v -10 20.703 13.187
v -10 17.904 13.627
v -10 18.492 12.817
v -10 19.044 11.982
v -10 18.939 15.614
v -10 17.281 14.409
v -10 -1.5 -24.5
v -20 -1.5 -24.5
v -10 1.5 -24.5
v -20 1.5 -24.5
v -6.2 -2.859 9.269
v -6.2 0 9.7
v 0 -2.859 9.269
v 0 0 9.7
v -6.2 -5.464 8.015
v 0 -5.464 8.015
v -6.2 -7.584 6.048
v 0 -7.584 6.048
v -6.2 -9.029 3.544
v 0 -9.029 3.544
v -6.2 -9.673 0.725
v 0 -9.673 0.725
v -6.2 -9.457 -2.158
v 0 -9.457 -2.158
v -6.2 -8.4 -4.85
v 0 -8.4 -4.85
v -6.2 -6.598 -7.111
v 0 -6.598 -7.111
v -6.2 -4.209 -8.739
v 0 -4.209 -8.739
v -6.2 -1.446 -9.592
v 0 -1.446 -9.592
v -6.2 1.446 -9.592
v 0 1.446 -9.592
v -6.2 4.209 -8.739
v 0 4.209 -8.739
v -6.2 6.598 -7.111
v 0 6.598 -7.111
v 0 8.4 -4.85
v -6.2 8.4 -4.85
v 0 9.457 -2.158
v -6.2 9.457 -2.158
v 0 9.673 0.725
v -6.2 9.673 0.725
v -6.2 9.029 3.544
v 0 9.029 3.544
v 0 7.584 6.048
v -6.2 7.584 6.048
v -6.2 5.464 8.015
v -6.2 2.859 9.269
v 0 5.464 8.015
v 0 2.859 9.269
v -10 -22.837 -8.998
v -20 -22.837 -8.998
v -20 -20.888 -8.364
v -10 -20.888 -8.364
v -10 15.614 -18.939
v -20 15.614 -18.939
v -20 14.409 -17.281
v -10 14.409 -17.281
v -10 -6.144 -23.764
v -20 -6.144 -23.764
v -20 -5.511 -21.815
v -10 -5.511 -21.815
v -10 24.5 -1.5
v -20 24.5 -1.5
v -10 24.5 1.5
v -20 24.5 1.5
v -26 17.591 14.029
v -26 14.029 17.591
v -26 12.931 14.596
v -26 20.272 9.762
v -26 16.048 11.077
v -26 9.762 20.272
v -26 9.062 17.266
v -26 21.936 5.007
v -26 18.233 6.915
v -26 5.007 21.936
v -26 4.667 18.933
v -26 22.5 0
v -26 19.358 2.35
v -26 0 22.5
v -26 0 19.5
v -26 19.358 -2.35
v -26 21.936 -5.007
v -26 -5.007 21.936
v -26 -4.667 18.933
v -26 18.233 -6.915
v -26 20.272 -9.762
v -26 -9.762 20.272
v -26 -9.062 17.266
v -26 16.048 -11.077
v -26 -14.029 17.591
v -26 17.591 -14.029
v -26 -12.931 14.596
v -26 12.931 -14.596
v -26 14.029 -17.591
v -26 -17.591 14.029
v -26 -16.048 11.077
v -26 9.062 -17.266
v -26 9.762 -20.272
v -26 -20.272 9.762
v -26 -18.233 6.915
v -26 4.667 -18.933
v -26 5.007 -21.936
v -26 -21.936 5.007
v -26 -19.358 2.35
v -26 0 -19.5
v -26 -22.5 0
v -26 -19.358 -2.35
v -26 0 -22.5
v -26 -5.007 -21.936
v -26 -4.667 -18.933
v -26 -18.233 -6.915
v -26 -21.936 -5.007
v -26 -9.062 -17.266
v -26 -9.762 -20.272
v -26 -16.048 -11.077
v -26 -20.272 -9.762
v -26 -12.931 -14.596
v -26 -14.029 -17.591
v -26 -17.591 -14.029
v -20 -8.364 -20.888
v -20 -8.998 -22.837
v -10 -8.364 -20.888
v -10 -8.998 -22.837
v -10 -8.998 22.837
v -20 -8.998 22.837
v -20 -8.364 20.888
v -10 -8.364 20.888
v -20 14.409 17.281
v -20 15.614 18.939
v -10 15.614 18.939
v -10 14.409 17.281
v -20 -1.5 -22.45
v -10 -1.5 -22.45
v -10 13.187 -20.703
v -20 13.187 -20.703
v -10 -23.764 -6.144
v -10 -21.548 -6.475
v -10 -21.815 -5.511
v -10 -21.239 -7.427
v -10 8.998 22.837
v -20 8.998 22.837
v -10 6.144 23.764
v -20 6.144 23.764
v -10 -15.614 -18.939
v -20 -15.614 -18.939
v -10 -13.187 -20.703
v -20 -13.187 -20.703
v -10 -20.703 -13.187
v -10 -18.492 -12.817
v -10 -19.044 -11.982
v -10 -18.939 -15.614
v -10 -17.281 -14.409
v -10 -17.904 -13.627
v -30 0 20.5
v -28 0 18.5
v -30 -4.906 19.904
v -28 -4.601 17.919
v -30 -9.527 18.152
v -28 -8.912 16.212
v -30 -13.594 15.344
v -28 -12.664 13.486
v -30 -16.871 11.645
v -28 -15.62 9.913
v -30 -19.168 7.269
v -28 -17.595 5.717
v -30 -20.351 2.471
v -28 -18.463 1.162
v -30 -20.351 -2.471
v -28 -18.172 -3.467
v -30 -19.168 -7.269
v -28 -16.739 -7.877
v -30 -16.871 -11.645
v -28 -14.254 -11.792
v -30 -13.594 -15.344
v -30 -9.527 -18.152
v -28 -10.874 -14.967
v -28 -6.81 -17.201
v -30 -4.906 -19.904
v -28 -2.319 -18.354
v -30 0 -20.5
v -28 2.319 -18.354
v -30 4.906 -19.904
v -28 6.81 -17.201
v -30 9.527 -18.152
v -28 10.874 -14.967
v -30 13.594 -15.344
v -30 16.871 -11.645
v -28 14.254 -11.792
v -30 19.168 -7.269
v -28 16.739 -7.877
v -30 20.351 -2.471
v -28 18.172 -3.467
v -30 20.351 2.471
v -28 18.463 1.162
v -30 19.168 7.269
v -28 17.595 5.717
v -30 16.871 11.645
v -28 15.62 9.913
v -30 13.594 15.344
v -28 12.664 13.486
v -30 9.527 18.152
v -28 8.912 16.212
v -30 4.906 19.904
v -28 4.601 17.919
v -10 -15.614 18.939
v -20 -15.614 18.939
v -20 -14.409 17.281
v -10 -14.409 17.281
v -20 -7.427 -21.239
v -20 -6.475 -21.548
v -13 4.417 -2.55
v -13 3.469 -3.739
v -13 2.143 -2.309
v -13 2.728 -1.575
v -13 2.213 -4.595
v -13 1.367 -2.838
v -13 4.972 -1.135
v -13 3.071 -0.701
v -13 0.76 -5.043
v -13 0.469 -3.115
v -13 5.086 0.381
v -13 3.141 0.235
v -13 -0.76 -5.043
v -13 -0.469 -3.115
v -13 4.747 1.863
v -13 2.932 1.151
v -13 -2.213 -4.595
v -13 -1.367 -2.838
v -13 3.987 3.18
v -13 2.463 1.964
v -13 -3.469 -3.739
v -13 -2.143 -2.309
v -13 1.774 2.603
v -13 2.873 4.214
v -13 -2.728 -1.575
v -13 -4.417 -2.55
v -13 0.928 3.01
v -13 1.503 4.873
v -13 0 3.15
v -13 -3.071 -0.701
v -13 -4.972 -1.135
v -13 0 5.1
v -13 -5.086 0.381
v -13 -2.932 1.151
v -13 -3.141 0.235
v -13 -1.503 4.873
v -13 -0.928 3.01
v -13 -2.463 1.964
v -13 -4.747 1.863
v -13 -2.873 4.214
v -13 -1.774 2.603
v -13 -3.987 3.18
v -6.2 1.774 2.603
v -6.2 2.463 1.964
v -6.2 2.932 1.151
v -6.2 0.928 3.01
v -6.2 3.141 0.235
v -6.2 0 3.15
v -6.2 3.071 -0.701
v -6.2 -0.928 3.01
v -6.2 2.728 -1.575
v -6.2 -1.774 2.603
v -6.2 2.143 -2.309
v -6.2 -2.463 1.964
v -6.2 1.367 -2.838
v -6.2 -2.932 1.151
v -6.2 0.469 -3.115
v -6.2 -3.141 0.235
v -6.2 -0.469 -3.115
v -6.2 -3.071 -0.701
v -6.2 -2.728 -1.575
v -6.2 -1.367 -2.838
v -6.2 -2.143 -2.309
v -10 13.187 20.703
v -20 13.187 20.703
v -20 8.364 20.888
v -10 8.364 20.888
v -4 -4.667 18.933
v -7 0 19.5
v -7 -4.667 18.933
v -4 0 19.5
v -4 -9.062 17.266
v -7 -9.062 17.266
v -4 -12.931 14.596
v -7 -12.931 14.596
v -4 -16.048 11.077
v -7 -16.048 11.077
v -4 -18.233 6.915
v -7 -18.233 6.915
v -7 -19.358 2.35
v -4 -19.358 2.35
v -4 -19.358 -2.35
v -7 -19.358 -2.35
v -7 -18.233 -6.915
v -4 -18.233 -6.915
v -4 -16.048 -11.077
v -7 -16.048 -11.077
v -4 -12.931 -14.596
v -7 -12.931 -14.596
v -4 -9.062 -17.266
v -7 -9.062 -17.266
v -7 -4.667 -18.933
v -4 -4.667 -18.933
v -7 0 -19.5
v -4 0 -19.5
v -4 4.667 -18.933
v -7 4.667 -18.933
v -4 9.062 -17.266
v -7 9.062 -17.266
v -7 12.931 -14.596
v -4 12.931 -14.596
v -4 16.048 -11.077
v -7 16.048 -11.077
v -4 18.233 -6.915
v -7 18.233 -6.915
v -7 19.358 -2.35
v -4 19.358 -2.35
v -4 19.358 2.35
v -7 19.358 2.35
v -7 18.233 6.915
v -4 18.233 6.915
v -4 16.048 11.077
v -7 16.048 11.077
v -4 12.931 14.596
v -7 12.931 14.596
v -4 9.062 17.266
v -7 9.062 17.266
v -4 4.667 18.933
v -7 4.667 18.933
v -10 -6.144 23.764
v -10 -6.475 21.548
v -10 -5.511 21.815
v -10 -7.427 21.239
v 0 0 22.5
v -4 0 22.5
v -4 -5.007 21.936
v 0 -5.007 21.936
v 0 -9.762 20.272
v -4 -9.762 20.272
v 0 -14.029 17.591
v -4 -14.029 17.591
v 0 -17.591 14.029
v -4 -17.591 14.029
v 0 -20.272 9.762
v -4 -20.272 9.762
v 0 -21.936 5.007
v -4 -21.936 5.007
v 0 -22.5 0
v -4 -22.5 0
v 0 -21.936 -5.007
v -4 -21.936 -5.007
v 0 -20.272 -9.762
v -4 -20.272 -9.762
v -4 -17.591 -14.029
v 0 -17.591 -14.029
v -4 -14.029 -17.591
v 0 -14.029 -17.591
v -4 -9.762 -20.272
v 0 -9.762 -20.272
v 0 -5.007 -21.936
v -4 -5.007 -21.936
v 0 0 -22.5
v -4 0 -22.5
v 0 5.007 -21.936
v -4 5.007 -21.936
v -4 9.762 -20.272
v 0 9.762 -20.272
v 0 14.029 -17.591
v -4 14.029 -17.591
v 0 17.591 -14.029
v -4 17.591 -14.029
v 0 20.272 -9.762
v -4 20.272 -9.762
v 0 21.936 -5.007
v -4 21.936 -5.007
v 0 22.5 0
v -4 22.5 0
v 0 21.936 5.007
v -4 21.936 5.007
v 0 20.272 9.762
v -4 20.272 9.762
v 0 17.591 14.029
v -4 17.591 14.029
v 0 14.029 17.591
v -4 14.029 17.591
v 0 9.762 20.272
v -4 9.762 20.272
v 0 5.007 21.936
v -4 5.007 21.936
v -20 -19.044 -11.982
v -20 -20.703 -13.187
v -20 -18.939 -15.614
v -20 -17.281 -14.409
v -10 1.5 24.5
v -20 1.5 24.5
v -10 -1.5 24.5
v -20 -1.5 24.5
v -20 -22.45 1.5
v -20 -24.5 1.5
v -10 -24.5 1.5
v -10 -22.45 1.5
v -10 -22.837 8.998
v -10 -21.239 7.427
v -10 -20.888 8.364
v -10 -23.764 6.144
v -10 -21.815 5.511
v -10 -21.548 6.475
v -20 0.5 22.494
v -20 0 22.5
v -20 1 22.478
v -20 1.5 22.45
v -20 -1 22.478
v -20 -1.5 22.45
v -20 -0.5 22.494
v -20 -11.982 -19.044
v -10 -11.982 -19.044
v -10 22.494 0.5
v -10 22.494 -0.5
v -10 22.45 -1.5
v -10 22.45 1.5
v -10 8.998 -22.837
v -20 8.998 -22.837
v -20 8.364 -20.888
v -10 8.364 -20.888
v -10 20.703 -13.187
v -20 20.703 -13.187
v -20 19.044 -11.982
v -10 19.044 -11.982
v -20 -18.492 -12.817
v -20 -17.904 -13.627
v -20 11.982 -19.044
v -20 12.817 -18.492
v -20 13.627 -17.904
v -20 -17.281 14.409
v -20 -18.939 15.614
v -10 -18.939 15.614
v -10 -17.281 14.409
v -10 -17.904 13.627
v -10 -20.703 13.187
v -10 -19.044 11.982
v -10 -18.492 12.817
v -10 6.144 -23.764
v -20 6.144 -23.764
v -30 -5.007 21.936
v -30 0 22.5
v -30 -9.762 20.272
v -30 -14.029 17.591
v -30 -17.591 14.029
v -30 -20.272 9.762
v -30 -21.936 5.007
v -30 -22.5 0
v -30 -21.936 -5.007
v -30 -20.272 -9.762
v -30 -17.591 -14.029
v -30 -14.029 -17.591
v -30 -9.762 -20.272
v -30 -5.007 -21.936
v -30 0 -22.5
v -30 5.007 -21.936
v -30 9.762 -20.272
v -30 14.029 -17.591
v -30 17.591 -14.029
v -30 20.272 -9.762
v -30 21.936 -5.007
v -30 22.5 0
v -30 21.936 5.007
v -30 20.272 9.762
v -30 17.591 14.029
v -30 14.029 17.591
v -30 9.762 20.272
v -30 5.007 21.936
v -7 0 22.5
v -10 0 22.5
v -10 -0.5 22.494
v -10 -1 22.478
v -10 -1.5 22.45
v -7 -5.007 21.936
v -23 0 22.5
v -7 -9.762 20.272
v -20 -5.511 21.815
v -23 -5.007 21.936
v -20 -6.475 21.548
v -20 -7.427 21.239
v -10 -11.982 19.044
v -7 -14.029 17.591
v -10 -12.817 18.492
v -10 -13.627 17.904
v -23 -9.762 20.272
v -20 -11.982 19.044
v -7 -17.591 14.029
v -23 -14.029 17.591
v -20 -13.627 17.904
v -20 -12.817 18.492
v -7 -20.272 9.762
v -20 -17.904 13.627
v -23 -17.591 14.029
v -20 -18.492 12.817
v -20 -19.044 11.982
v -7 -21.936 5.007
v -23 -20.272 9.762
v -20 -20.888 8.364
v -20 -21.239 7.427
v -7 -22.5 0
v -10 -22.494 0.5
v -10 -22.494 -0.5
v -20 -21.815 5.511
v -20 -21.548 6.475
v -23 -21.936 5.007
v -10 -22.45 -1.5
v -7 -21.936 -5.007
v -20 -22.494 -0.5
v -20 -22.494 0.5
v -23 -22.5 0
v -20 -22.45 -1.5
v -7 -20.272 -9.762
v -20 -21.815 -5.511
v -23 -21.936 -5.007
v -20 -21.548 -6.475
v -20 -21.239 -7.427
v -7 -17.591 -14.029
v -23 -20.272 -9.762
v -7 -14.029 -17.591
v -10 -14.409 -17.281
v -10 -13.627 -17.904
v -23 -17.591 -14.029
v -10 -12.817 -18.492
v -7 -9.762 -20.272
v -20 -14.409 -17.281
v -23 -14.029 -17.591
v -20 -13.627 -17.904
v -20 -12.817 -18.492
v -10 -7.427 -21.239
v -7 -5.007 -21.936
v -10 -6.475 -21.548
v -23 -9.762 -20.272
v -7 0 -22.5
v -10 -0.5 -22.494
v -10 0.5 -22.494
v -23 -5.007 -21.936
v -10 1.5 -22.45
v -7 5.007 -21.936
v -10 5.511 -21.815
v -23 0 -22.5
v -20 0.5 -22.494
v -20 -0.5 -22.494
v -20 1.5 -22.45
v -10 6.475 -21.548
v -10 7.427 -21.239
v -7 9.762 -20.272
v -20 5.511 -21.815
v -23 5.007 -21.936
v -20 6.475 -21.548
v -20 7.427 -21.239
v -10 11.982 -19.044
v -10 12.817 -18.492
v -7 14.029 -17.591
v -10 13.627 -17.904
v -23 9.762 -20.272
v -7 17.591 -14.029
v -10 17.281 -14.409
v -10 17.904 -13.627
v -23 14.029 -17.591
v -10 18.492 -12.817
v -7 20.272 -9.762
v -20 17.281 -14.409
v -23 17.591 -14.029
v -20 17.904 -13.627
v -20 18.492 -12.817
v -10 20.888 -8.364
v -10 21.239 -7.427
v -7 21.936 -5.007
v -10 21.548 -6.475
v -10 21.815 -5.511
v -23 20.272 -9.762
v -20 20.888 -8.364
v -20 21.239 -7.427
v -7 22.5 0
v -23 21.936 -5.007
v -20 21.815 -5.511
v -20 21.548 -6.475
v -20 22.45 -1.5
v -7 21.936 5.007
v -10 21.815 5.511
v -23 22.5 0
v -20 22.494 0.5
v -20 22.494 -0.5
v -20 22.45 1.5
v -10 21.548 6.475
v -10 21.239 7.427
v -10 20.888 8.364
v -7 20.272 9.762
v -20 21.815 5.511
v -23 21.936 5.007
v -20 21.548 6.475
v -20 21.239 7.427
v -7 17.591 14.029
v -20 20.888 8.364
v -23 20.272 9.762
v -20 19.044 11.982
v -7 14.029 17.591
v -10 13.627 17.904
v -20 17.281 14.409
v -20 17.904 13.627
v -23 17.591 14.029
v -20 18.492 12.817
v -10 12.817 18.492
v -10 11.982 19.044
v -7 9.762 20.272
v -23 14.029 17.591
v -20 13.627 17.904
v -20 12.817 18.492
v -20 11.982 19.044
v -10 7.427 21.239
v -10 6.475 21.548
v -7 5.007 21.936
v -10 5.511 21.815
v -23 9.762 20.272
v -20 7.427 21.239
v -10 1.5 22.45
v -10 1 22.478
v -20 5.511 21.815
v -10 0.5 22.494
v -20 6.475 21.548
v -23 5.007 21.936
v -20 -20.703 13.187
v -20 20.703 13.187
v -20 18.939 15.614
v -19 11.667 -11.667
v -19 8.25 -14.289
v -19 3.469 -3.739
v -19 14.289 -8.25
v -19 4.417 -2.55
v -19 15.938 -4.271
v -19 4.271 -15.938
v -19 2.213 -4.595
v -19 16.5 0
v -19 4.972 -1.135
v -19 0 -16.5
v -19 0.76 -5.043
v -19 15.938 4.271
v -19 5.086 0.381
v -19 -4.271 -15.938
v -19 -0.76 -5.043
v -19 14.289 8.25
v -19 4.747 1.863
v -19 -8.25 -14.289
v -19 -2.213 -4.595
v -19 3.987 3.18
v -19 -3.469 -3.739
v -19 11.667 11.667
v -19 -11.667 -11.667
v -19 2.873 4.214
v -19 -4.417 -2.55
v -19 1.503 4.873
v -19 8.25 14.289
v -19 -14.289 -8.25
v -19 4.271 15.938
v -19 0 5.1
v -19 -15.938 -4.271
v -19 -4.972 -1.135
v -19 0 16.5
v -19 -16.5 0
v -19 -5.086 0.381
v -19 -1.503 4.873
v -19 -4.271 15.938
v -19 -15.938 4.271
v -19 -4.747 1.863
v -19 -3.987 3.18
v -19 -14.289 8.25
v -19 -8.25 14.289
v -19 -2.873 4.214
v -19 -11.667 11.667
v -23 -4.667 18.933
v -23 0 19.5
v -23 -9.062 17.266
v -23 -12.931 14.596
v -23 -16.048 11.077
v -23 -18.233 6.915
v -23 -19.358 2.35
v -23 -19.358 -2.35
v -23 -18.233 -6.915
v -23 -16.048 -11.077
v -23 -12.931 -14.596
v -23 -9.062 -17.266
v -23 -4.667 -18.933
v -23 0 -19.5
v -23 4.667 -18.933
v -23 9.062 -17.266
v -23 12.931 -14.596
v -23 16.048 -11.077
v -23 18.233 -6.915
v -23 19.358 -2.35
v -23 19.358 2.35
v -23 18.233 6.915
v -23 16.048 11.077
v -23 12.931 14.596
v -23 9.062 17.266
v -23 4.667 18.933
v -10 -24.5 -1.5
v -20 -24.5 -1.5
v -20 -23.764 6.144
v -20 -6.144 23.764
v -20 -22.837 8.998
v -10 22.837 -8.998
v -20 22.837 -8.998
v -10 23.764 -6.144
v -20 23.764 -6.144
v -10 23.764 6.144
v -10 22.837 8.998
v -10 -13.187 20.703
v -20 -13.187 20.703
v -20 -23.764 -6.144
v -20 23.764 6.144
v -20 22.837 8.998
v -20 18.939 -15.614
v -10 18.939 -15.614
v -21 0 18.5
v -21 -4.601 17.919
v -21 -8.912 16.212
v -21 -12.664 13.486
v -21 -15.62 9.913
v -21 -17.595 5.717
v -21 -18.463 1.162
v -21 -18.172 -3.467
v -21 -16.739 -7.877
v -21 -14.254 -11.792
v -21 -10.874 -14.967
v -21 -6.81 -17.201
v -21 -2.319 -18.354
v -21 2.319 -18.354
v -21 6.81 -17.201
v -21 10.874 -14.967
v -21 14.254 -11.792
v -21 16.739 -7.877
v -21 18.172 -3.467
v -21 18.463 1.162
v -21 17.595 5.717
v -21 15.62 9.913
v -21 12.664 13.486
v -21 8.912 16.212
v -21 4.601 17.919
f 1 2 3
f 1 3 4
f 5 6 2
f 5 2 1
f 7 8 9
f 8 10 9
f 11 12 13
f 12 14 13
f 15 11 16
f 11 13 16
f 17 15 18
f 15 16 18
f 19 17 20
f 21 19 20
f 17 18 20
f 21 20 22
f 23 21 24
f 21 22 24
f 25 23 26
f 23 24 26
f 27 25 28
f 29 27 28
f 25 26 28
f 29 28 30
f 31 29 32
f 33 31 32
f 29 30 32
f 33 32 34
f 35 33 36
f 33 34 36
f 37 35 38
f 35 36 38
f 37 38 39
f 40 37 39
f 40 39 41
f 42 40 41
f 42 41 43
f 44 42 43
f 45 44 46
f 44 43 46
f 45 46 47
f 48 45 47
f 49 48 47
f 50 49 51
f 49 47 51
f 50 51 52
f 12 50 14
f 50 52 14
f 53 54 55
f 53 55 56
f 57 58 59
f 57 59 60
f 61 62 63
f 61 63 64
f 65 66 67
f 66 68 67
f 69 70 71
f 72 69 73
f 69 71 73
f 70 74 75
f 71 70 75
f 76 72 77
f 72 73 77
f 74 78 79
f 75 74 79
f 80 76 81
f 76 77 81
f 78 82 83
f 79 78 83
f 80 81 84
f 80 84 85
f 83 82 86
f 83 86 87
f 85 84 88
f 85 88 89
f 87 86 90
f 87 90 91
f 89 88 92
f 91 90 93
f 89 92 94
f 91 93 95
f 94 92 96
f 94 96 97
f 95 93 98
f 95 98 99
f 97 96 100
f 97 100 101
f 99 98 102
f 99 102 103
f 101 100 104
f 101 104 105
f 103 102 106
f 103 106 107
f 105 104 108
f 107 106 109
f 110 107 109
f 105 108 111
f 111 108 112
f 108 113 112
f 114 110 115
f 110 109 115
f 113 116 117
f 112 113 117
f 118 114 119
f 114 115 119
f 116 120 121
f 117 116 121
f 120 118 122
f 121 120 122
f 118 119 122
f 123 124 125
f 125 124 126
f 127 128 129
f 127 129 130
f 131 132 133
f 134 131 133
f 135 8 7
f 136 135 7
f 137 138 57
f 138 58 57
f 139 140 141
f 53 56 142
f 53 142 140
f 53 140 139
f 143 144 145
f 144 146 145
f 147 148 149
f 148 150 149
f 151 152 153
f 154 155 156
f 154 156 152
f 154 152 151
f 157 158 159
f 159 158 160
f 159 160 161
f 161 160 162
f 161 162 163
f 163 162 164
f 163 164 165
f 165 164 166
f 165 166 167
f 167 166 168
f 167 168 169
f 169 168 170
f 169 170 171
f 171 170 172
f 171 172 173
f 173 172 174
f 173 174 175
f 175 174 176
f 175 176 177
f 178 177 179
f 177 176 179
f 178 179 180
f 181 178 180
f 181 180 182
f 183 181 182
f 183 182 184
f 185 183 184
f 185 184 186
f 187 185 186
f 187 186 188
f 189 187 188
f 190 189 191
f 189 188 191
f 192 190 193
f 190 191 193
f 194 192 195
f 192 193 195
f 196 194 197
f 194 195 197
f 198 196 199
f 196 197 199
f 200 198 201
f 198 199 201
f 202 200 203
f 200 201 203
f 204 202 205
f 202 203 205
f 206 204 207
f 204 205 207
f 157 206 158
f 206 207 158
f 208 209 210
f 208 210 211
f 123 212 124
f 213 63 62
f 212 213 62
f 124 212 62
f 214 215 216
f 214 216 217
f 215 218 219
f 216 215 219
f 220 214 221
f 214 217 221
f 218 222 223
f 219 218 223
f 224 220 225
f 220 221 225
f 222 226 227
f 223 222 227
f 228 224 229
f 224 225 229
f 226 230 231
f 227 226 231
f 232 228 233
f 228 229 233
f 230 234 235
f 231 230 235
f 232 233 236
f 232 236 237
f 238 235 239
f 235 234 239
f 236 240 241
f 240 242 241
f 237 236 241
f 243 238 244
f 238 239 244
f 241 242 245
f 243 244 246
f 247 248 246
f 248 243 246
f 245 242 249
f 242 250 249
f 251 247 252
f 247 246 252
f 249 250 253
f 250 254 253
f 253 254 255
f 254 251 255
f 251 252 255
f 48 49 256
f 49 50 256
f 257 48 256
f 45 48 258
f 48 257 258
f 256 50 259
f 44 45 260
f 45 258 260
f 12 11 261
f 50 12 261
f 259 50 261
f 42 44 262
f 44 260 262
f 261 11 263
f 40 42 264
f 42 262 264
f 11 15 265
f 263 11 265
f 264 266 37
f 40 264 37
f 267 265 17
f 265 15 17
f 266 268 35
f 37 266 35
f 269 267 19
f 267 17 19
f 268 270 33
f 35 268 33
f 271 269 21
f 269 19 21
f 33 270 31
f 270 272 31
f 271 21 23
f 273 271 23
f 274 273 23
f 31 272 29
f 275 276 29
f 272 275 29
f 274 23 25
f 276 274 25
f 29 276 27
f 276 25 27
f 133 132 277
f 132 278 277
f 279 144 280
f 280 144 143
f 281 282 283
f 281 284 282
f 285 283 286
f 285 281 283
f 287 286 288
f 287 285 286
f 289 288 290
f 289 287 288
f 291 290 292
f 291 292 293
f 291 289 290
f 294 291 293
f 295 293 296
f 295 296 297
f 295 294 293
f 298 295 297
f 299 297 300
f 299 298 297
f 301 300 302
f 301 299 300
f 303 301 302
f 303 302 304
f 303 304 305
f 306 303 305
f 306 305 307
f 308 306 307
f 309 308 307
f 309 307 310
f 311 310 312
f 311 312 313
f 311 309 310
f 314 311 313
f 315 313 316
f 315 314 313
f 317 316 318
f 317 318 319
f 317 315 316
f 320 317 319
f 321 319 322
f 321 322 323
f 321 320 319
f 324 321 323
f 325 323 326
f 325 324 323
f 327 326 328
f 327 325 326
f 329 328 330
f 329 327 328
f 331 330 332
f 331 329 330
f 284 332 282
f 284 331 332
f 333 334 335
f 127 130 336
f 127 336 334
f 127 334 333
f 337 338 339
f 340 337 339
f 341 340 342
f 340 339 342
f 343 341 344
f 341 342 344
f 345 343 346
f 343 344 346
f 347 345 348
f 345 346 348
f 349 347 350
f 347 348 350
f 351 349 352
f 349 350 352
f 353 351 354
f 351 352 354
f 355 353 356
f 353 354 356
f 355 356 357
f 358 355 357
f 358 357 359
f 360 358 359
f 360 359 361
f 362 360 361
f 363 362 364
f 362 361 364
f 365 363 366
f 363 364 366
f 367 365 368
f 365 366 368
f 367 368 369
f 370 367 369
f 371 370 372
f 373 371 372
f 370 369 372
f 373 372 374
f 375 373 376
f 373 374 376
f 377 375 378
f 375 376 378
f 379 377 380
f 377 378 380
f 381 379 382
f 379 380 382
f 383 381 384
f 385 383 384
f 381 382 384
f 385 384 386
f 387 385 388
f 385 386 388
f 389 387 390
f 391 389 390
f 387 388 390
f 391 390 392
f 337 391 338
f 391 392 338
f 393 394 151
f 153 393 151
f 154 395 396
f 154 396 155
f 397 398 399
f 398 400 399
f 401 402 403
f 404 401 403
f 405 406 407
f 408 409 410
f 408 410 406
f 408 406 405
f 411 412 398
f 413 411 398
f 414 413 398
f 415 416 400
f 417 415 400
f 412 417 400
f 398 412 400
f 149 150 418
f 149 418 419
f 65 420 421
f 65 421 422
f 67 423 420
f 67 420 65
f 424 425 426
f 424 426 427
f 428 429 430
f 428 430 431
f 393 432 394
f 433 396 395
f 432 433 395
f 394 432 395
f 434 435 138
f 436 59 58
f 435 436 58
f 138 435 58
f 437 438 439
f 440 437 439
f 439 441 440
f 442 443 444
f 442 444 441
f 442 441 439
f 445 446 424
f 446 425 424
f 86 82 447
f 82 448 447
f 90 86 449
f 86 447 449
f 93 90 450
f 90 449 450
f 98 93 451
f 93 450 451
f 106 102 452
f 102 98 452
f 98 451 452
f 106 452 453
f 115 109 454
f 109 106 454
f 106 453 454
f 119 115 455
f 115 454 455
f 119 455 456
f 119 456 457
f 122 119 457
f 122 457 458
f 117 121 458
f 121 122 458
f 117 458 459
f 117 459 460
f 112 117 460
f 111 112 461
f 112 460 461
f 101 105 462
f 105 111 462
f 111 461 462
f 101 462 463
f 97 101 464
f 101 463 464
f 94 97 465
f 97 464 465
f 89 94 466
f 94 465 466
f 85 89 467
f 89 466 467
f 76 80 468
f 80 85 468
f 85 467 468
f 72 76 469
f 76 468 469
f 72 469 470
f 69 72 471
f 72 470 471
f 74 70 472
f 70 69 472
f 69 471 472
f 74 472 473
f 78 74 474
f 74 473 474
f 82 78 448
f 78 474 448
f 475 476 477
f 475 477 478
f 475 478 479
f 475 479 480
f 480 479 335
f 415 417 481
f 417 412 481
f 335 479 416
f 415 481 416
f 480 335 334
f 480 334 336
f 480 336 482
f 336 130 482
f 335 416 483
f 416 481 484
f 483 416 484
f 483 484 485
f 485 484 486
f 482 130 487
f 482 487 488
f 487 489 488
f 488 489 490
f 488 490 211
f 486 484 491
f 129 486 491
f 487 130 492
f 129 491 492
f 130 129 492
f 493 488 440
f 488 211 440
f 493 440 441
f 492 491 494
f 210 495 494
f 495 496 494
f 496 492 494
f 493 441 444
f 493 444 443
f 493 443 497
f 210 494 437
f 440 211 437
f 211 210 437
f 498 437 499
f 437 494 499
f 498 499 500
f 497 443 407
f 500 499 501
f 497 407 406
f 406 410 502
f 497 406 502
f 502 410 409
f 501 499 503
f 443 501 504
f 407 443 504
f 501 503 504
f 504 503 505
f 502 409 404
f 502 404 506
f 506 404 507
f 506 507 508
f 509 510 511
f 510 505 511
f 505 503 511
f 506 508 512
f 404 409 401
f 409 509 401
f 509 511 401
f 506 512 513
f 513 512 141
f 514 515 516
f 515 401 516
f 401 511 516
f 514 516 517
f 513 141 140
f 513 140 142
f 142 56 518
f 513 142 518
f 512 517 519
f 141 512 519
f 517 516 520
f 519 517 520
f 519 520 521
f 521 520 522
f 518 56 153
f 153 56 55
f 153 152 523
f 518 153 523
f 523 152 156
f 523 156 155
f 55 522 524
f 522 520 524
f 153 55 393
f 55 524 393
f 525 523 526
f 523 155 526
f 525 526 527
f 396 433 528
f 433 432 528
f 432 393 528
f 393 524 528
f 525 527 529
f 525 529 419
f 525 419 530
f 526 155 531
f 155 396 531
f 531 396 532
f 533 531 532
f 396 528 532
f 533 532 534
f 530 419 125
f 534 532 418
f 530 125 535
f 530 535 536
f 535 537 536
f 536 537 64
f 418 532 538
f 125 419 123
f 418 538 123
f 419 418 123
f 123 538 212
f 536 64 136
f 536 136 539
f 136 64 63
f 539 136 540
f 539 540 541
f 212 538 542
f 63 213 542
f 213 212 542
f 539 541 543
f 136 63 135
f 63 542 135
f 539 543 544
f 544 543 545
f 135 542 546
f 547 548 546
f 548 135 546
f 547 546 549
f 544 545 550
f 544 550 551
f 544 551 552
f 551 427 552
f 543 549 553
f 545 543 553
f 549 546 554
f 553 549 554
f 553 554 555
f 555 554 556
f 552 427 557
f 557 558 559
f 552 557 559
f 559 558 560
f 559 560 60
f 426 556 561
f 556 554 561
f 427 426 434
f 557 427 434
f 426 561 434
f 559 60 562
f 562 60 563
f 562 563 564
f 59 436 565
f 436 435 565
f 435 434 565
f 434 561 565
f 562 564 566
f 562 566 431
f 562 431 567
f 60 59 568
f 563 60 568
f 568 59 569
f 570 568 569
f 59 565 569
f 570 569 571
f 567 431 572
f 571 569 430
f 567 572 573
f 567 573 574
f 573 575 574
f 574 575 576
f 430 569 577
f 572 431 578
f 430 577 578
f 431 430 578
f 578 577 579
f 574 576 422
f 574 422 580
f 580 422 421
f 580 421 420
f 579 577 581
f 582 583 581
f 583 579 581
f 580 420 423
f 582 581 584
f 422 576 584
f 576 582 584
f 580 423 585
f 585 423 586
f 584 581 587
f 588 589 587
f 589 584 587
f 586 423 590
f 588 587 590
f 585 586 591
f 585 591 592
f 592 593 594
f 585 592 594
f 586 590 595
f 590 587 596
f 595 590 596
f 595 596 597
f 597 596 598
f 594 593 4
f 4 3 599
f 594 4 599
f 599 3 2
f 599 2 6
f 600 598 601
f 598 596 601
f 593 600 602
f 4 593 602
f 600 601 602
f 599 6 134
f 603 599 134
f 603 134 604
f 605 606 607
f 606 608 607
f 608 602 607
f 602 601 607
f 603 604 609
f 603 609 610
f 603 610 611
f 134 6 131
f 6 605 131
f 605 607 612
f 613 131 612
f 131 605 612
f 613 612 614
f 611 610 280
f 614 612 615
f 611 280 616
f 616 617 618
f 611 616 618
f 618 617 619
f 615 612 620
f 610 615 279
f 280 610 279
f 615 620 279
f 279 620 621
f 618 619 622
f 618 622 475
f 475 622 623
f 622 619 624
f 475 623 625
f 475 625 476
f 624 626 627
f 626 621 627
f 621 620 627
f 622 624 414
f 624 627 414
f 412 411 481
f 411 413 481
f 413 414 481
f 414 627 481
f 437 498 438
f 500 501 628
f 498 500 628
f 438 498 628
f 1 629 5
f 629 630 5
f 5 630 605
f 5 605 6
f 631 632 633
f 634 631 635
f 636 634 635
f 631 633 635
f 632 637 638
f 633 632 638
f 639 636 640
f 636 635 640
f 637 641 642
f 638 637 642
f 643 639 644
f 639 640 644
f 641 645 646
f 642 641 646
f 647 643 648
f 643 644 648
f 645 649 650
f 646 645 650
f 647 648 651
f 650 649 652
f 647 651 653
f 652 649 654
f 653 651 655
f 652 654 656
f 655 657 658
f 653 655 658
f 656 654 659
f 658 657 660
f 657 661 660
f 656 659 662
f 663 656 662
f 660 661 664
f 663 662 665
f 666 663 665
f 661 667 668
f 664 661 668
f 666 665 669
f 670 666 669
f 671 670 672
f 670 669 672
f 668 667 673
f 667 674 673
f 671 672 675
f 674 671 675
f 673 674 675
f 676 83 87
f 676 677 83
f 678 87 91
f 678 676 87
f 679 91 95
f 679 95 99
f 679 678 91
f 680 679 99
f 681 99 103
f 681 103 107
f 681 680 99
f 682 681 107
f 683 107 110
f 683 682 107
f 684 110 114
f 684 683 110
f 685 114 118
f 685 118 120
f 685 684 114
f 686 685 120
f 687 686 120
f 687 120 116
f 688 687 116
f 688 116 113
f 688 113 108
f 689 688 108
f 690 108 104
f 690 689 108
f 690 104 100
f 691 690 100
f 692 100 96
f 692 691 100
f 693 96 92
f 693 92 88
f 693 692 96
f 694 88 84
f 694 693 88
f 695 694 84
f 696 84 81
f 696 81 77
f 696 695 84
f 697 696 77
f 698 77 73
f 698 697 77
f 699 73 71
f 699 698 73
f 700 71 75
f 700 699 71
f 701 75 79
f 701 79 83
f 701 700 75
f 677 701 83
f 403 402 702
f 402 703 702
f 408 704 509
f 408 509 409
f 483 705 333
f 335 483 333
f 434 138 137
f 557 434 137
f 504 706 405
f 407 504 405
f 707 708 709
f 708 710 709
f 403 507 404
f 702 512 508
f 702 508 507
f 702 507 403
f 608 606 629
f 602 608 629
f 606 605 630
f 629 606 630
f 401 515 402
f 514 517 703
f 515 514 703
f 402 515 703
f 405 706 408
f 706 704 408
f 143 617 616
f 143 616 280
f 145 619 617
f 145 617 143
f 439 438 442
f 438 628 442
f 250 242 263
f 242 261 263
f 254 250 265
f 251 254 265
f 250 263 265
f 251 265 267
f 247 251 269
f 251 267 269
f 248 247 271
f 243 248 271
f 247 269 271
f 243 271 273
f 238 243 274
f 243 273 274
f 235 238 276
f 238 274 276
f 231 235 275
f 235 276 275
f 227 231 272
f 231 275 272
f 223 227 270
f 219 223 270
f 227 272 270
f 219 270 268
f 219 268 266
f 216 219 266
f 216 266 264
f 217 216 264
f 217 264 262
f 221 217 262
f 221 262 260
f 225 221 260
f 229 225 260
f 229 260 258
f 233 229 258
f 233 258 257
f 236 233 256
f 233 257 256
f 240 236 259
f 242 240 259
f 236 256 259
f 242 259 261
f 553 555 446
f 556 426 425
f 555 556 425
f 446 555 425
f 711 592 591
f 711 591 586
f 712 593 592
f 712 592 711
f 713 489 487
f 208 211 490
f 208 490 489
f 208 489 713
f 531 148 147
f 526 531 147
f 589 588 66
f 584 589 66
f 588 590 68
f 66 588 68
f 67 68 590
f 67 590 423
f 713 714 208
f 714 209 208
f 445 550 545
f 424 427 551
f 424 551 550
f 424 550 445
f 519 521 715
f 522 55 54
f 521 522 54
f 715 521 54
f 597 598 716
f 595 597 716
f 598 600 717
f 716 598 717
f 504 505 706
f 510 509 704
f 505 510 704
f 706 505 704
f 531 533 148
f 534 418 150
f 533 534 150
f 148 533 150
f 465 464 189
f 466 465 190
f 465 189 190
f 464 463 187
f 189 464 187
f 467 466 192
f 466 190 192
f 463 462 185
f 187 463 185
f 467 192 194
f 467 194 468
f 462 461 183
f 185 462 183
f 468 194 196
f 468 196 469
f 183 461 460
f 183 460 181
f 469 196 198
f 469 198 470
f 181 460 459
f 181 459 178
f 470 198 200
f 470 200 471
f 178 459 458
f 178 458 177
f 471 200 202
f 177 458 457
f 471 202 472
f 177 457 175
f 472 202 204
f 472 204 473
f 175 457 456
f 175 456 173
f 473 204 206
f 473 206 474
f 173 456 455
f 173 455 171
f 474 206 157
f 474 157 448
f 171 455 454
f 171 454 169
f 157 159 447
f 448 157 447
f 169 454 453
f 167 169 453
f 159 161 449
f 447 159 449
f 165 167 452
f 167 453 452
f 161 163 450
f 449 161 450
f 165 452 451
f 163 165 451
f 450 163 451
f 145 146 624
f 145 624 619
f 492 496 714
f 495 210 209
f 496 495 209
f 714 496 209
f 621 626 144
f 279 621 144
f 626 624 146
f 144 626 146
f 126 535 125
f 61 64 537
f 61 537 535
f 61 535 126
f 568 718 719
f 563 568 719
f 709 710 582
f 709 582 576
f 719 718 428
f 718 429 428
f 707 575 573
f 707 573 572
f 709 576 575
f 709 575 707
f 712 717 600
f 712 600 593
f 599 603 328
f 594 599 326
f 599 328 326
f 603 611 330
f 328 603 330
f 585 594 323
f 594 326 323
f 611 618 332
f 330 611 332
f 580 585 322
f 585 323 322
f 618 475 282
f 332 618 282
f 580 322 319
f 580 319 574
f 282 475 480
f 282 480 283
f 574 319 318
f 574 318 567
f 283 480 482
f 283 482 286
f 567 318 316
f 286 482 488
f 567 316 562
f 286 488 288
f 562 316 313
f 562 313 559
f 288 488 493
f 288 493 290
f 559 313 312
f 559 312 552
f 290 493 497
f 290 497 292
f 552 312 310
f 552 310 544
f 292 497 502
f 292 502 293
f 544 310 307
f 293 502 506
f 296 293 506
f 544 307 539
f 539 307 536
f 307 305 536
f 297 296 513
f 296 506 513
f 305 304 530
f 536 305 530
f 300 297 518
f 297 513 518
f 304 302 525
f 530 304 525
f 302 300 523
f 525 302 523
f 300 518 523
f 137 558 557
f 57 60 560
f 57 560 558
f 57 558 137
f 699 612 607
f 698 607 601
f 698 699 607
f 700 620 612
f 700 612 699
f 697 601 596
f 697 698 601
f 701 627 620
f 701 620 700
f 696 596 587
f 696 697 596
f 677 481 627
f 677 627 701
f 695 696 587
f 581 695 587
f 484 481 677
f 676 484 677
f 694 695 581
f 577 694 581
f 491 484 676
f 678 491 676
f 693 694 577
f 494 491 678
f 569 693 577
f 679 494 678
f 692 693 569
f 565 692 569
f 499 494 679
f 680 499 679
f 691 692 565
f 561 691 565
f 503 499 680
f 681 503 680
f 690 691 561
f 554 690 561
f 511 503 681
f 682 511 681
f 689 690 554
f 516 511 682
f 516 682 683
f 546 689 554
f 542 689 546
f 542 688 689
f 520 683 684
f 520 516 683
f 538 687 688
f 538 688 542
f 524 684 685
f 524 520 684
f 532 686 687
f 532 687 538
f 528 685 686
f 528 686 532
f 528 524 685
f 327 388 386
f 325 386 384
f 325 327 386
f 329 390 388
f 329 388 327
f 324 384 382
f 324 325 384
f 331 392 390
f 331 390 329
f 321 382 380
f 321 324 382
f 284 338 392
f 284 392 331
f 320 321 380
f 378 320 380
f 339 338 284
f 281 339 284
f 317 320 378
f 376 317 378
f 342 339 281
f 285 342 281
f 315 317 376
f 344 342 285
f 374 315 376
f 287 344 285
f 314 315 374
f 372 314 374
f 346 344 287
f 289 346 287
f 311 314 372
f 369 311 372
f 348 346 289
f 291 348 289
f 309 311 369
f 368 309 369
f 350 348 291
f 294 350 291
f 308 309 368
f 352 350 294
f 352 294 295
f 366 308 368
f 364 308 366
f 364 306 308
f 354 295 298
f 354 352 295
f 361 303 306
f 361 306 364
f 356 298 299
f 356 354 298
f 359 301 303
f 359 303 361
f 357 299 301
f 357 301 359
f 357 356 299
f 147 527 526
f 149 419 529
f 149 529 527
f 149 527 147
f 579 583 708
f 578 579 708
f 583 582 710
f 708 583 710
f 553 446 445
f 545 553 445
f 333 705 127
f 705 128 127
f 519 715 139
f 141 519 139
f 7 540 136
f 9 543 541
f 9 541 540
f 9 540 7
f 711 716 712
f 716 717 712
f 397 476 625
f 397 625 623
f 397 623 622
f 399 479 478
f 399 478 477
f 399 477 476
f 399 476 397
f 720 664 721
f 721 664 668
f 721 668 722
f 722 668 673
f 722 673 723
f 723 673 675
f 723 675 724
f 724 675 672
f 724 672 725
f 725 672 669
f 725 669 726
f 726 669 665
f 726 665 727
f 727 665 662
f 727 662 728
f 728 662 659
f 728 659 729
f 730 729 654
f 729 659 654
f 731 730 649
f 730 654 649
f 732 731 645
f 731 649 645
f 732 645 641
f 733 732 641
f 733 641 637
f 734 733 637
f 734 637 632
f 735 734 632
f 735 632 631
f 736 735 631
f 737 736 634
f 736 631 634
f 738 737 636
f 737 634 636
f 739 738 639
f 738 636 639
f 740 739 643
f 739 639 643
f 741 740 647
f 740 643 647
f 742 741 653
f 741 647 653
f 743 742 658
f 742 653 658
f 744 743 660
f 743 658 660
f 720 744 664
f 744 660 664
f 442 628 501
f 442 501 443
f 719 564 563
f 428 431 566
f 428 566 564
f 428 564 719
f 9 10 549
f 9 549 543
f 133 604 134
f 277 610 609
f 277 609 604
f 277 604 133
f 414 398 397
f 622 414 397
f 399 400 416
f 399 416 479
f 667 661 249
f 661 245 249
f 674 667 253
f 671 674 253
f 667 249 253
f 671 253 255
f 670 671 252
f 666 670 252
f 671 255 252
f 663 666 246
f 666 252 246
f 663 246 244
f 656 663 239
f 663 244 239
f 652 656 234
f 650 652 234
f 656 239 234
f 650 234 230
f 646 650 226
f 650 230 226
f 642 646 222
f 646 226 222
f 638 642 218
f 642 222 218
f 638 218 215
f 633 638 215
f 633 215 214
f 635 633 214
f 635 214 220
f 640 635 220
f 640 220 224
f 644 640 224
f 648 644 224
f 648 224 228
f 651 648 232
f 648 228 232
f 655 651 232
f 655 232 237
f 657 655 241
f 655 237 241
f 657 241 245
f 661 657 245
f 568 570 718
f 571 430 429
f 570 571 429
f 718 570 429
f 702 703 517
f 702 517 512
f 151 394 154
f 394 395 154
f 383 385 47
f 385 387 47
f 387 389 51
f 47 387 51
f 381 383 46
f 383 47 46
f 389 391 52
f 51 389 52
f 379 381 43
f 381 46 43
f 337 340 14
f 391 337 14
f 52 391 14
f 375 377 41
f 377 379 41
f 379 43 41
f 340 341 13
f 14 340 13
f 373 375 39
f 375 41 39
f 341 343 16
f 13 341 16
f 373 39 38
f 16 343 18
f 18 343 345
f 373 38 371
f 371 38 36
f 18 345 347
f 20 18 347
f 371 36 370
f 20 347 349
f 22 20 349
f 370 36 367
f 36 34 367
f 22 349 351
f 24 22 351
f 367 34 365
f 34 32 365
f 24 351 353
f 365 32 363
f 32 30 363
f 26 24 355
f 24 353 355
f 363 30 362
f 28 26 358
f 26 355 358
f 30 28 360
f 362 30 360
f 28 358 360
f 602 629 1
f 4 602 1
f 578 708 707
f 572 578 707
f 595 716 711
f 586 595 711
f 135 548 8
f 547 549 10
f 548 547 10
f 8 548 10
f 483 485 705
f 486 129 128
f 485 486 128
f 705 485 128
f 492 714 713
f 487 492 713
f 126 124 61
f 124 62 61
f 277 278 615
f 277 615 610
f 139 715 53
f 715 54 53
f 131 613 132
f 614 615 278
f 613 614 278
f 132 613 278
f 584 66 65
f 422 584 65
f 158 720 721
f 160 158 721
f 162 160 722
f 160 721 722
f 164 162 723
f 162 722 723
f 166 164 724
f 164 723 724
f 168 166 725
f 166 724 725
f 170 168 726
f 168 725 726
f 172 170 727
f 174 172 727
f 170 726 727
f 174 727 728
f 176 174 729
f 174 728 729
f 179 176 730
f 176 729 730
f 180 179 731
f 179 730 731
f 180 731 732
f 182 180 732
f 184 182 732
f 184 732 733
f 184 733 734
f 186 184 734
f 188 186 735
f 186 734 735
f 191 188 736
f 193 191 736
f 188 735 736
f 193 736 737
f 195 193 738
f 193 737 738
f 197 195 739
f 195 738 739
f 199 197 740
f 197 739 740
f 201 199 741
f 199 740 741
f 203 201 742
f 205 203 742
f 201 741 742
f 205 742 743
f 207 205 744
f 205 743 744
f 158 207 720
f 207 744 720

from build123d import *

# Parameters (mm, degrees)
CHAMFER_2_SIZE           = 2
SKETCH_6_W               = 3
SKETCH_6_H               = 4
SKETCH_7_W               = 10
SKETCH_7_H               = 3.436723268
EXTRUDE_1_DEPTH          = 1.5
PATTERN_CIRCULAR_1_COUNT = 20


with BuildPart() as part:
    # Эскиз4 → Повернуть1 (revolve)
    with BuildSketch(Plane.XY, mode=Mode.PRIVATE) as revolve_1_sk:
        Polygon((0, 22.5), (-30, 22.5), (-30, 18.5), (-19, 18.5), (-19, 5.1), (-13, 5.1), (-13, 3.15), (-6.2, 3.15), (-6.2, 9.7), (0, 9.7), align=None)
    revolve(revolve_1_sk.sketch.rotate(Axis((-30, 0, 0), (1, 0, 0)), 90), axis=Axis((-30, 0, 0), (1, 0, 0)))

    # Фаска2
    chamfer_2_edges = [part.edges().sort_by_distance(p)[0] for p in [
        (-19, 0, -18.5),
        (-30, 0, -18.5),
    ]]
    chamfer(chamfer_2_edges, length=CHAMFER_2_SIZE)

    # Эскиз6 → Вырез-Повернуть2 (revolve, cut)
    with BuildSketch(Plane.XY, mode=Mode.PRIVATE) as cut_revolve_2_sk:
        with Locations((-24.5, 21.5)):
            Rectangle(SKETCH_6_W, SKETCH_6_H)
        with Locations((-5.5, 21.5)):
            Rectangle(SKETCH_6_W, SKETCH_6_H)
    revolve(cut_revolve_2_sk.sketch.rotate(Axis((-30, 0, 0), (1, 0, 0)), 90), axis=Axis((-30, 0, 0), (1, 0, 0)), mode=Mode.SUBTRACT)

    # Эскиз7 → Бобышка-Вытянуть1 (add, symmetric)
    with BuildSketch(Plane.XY):
        with Locations((-15, 22.781638366)):
            Rectangle(SKETCH_7_W, SKETCH_7_H)
    extrude_1 = extrude(amount=EXTRUDE_1_DEPTH, both=True)

    # Круговой массив1: Бобышка-Вытянуть1 ×20 about axis
    pattern_circular_1_axis = Axis((0, 0, 0), (1, 0, 0))
    for i in range(1, PATTERN_CIRCULAR_1_COUNT):
        add(extrude_1.rotate(pattern_circular_1_axis, i * 360 / PATTERN_CIRCULAR_1_COUNT))


solid = part.part
